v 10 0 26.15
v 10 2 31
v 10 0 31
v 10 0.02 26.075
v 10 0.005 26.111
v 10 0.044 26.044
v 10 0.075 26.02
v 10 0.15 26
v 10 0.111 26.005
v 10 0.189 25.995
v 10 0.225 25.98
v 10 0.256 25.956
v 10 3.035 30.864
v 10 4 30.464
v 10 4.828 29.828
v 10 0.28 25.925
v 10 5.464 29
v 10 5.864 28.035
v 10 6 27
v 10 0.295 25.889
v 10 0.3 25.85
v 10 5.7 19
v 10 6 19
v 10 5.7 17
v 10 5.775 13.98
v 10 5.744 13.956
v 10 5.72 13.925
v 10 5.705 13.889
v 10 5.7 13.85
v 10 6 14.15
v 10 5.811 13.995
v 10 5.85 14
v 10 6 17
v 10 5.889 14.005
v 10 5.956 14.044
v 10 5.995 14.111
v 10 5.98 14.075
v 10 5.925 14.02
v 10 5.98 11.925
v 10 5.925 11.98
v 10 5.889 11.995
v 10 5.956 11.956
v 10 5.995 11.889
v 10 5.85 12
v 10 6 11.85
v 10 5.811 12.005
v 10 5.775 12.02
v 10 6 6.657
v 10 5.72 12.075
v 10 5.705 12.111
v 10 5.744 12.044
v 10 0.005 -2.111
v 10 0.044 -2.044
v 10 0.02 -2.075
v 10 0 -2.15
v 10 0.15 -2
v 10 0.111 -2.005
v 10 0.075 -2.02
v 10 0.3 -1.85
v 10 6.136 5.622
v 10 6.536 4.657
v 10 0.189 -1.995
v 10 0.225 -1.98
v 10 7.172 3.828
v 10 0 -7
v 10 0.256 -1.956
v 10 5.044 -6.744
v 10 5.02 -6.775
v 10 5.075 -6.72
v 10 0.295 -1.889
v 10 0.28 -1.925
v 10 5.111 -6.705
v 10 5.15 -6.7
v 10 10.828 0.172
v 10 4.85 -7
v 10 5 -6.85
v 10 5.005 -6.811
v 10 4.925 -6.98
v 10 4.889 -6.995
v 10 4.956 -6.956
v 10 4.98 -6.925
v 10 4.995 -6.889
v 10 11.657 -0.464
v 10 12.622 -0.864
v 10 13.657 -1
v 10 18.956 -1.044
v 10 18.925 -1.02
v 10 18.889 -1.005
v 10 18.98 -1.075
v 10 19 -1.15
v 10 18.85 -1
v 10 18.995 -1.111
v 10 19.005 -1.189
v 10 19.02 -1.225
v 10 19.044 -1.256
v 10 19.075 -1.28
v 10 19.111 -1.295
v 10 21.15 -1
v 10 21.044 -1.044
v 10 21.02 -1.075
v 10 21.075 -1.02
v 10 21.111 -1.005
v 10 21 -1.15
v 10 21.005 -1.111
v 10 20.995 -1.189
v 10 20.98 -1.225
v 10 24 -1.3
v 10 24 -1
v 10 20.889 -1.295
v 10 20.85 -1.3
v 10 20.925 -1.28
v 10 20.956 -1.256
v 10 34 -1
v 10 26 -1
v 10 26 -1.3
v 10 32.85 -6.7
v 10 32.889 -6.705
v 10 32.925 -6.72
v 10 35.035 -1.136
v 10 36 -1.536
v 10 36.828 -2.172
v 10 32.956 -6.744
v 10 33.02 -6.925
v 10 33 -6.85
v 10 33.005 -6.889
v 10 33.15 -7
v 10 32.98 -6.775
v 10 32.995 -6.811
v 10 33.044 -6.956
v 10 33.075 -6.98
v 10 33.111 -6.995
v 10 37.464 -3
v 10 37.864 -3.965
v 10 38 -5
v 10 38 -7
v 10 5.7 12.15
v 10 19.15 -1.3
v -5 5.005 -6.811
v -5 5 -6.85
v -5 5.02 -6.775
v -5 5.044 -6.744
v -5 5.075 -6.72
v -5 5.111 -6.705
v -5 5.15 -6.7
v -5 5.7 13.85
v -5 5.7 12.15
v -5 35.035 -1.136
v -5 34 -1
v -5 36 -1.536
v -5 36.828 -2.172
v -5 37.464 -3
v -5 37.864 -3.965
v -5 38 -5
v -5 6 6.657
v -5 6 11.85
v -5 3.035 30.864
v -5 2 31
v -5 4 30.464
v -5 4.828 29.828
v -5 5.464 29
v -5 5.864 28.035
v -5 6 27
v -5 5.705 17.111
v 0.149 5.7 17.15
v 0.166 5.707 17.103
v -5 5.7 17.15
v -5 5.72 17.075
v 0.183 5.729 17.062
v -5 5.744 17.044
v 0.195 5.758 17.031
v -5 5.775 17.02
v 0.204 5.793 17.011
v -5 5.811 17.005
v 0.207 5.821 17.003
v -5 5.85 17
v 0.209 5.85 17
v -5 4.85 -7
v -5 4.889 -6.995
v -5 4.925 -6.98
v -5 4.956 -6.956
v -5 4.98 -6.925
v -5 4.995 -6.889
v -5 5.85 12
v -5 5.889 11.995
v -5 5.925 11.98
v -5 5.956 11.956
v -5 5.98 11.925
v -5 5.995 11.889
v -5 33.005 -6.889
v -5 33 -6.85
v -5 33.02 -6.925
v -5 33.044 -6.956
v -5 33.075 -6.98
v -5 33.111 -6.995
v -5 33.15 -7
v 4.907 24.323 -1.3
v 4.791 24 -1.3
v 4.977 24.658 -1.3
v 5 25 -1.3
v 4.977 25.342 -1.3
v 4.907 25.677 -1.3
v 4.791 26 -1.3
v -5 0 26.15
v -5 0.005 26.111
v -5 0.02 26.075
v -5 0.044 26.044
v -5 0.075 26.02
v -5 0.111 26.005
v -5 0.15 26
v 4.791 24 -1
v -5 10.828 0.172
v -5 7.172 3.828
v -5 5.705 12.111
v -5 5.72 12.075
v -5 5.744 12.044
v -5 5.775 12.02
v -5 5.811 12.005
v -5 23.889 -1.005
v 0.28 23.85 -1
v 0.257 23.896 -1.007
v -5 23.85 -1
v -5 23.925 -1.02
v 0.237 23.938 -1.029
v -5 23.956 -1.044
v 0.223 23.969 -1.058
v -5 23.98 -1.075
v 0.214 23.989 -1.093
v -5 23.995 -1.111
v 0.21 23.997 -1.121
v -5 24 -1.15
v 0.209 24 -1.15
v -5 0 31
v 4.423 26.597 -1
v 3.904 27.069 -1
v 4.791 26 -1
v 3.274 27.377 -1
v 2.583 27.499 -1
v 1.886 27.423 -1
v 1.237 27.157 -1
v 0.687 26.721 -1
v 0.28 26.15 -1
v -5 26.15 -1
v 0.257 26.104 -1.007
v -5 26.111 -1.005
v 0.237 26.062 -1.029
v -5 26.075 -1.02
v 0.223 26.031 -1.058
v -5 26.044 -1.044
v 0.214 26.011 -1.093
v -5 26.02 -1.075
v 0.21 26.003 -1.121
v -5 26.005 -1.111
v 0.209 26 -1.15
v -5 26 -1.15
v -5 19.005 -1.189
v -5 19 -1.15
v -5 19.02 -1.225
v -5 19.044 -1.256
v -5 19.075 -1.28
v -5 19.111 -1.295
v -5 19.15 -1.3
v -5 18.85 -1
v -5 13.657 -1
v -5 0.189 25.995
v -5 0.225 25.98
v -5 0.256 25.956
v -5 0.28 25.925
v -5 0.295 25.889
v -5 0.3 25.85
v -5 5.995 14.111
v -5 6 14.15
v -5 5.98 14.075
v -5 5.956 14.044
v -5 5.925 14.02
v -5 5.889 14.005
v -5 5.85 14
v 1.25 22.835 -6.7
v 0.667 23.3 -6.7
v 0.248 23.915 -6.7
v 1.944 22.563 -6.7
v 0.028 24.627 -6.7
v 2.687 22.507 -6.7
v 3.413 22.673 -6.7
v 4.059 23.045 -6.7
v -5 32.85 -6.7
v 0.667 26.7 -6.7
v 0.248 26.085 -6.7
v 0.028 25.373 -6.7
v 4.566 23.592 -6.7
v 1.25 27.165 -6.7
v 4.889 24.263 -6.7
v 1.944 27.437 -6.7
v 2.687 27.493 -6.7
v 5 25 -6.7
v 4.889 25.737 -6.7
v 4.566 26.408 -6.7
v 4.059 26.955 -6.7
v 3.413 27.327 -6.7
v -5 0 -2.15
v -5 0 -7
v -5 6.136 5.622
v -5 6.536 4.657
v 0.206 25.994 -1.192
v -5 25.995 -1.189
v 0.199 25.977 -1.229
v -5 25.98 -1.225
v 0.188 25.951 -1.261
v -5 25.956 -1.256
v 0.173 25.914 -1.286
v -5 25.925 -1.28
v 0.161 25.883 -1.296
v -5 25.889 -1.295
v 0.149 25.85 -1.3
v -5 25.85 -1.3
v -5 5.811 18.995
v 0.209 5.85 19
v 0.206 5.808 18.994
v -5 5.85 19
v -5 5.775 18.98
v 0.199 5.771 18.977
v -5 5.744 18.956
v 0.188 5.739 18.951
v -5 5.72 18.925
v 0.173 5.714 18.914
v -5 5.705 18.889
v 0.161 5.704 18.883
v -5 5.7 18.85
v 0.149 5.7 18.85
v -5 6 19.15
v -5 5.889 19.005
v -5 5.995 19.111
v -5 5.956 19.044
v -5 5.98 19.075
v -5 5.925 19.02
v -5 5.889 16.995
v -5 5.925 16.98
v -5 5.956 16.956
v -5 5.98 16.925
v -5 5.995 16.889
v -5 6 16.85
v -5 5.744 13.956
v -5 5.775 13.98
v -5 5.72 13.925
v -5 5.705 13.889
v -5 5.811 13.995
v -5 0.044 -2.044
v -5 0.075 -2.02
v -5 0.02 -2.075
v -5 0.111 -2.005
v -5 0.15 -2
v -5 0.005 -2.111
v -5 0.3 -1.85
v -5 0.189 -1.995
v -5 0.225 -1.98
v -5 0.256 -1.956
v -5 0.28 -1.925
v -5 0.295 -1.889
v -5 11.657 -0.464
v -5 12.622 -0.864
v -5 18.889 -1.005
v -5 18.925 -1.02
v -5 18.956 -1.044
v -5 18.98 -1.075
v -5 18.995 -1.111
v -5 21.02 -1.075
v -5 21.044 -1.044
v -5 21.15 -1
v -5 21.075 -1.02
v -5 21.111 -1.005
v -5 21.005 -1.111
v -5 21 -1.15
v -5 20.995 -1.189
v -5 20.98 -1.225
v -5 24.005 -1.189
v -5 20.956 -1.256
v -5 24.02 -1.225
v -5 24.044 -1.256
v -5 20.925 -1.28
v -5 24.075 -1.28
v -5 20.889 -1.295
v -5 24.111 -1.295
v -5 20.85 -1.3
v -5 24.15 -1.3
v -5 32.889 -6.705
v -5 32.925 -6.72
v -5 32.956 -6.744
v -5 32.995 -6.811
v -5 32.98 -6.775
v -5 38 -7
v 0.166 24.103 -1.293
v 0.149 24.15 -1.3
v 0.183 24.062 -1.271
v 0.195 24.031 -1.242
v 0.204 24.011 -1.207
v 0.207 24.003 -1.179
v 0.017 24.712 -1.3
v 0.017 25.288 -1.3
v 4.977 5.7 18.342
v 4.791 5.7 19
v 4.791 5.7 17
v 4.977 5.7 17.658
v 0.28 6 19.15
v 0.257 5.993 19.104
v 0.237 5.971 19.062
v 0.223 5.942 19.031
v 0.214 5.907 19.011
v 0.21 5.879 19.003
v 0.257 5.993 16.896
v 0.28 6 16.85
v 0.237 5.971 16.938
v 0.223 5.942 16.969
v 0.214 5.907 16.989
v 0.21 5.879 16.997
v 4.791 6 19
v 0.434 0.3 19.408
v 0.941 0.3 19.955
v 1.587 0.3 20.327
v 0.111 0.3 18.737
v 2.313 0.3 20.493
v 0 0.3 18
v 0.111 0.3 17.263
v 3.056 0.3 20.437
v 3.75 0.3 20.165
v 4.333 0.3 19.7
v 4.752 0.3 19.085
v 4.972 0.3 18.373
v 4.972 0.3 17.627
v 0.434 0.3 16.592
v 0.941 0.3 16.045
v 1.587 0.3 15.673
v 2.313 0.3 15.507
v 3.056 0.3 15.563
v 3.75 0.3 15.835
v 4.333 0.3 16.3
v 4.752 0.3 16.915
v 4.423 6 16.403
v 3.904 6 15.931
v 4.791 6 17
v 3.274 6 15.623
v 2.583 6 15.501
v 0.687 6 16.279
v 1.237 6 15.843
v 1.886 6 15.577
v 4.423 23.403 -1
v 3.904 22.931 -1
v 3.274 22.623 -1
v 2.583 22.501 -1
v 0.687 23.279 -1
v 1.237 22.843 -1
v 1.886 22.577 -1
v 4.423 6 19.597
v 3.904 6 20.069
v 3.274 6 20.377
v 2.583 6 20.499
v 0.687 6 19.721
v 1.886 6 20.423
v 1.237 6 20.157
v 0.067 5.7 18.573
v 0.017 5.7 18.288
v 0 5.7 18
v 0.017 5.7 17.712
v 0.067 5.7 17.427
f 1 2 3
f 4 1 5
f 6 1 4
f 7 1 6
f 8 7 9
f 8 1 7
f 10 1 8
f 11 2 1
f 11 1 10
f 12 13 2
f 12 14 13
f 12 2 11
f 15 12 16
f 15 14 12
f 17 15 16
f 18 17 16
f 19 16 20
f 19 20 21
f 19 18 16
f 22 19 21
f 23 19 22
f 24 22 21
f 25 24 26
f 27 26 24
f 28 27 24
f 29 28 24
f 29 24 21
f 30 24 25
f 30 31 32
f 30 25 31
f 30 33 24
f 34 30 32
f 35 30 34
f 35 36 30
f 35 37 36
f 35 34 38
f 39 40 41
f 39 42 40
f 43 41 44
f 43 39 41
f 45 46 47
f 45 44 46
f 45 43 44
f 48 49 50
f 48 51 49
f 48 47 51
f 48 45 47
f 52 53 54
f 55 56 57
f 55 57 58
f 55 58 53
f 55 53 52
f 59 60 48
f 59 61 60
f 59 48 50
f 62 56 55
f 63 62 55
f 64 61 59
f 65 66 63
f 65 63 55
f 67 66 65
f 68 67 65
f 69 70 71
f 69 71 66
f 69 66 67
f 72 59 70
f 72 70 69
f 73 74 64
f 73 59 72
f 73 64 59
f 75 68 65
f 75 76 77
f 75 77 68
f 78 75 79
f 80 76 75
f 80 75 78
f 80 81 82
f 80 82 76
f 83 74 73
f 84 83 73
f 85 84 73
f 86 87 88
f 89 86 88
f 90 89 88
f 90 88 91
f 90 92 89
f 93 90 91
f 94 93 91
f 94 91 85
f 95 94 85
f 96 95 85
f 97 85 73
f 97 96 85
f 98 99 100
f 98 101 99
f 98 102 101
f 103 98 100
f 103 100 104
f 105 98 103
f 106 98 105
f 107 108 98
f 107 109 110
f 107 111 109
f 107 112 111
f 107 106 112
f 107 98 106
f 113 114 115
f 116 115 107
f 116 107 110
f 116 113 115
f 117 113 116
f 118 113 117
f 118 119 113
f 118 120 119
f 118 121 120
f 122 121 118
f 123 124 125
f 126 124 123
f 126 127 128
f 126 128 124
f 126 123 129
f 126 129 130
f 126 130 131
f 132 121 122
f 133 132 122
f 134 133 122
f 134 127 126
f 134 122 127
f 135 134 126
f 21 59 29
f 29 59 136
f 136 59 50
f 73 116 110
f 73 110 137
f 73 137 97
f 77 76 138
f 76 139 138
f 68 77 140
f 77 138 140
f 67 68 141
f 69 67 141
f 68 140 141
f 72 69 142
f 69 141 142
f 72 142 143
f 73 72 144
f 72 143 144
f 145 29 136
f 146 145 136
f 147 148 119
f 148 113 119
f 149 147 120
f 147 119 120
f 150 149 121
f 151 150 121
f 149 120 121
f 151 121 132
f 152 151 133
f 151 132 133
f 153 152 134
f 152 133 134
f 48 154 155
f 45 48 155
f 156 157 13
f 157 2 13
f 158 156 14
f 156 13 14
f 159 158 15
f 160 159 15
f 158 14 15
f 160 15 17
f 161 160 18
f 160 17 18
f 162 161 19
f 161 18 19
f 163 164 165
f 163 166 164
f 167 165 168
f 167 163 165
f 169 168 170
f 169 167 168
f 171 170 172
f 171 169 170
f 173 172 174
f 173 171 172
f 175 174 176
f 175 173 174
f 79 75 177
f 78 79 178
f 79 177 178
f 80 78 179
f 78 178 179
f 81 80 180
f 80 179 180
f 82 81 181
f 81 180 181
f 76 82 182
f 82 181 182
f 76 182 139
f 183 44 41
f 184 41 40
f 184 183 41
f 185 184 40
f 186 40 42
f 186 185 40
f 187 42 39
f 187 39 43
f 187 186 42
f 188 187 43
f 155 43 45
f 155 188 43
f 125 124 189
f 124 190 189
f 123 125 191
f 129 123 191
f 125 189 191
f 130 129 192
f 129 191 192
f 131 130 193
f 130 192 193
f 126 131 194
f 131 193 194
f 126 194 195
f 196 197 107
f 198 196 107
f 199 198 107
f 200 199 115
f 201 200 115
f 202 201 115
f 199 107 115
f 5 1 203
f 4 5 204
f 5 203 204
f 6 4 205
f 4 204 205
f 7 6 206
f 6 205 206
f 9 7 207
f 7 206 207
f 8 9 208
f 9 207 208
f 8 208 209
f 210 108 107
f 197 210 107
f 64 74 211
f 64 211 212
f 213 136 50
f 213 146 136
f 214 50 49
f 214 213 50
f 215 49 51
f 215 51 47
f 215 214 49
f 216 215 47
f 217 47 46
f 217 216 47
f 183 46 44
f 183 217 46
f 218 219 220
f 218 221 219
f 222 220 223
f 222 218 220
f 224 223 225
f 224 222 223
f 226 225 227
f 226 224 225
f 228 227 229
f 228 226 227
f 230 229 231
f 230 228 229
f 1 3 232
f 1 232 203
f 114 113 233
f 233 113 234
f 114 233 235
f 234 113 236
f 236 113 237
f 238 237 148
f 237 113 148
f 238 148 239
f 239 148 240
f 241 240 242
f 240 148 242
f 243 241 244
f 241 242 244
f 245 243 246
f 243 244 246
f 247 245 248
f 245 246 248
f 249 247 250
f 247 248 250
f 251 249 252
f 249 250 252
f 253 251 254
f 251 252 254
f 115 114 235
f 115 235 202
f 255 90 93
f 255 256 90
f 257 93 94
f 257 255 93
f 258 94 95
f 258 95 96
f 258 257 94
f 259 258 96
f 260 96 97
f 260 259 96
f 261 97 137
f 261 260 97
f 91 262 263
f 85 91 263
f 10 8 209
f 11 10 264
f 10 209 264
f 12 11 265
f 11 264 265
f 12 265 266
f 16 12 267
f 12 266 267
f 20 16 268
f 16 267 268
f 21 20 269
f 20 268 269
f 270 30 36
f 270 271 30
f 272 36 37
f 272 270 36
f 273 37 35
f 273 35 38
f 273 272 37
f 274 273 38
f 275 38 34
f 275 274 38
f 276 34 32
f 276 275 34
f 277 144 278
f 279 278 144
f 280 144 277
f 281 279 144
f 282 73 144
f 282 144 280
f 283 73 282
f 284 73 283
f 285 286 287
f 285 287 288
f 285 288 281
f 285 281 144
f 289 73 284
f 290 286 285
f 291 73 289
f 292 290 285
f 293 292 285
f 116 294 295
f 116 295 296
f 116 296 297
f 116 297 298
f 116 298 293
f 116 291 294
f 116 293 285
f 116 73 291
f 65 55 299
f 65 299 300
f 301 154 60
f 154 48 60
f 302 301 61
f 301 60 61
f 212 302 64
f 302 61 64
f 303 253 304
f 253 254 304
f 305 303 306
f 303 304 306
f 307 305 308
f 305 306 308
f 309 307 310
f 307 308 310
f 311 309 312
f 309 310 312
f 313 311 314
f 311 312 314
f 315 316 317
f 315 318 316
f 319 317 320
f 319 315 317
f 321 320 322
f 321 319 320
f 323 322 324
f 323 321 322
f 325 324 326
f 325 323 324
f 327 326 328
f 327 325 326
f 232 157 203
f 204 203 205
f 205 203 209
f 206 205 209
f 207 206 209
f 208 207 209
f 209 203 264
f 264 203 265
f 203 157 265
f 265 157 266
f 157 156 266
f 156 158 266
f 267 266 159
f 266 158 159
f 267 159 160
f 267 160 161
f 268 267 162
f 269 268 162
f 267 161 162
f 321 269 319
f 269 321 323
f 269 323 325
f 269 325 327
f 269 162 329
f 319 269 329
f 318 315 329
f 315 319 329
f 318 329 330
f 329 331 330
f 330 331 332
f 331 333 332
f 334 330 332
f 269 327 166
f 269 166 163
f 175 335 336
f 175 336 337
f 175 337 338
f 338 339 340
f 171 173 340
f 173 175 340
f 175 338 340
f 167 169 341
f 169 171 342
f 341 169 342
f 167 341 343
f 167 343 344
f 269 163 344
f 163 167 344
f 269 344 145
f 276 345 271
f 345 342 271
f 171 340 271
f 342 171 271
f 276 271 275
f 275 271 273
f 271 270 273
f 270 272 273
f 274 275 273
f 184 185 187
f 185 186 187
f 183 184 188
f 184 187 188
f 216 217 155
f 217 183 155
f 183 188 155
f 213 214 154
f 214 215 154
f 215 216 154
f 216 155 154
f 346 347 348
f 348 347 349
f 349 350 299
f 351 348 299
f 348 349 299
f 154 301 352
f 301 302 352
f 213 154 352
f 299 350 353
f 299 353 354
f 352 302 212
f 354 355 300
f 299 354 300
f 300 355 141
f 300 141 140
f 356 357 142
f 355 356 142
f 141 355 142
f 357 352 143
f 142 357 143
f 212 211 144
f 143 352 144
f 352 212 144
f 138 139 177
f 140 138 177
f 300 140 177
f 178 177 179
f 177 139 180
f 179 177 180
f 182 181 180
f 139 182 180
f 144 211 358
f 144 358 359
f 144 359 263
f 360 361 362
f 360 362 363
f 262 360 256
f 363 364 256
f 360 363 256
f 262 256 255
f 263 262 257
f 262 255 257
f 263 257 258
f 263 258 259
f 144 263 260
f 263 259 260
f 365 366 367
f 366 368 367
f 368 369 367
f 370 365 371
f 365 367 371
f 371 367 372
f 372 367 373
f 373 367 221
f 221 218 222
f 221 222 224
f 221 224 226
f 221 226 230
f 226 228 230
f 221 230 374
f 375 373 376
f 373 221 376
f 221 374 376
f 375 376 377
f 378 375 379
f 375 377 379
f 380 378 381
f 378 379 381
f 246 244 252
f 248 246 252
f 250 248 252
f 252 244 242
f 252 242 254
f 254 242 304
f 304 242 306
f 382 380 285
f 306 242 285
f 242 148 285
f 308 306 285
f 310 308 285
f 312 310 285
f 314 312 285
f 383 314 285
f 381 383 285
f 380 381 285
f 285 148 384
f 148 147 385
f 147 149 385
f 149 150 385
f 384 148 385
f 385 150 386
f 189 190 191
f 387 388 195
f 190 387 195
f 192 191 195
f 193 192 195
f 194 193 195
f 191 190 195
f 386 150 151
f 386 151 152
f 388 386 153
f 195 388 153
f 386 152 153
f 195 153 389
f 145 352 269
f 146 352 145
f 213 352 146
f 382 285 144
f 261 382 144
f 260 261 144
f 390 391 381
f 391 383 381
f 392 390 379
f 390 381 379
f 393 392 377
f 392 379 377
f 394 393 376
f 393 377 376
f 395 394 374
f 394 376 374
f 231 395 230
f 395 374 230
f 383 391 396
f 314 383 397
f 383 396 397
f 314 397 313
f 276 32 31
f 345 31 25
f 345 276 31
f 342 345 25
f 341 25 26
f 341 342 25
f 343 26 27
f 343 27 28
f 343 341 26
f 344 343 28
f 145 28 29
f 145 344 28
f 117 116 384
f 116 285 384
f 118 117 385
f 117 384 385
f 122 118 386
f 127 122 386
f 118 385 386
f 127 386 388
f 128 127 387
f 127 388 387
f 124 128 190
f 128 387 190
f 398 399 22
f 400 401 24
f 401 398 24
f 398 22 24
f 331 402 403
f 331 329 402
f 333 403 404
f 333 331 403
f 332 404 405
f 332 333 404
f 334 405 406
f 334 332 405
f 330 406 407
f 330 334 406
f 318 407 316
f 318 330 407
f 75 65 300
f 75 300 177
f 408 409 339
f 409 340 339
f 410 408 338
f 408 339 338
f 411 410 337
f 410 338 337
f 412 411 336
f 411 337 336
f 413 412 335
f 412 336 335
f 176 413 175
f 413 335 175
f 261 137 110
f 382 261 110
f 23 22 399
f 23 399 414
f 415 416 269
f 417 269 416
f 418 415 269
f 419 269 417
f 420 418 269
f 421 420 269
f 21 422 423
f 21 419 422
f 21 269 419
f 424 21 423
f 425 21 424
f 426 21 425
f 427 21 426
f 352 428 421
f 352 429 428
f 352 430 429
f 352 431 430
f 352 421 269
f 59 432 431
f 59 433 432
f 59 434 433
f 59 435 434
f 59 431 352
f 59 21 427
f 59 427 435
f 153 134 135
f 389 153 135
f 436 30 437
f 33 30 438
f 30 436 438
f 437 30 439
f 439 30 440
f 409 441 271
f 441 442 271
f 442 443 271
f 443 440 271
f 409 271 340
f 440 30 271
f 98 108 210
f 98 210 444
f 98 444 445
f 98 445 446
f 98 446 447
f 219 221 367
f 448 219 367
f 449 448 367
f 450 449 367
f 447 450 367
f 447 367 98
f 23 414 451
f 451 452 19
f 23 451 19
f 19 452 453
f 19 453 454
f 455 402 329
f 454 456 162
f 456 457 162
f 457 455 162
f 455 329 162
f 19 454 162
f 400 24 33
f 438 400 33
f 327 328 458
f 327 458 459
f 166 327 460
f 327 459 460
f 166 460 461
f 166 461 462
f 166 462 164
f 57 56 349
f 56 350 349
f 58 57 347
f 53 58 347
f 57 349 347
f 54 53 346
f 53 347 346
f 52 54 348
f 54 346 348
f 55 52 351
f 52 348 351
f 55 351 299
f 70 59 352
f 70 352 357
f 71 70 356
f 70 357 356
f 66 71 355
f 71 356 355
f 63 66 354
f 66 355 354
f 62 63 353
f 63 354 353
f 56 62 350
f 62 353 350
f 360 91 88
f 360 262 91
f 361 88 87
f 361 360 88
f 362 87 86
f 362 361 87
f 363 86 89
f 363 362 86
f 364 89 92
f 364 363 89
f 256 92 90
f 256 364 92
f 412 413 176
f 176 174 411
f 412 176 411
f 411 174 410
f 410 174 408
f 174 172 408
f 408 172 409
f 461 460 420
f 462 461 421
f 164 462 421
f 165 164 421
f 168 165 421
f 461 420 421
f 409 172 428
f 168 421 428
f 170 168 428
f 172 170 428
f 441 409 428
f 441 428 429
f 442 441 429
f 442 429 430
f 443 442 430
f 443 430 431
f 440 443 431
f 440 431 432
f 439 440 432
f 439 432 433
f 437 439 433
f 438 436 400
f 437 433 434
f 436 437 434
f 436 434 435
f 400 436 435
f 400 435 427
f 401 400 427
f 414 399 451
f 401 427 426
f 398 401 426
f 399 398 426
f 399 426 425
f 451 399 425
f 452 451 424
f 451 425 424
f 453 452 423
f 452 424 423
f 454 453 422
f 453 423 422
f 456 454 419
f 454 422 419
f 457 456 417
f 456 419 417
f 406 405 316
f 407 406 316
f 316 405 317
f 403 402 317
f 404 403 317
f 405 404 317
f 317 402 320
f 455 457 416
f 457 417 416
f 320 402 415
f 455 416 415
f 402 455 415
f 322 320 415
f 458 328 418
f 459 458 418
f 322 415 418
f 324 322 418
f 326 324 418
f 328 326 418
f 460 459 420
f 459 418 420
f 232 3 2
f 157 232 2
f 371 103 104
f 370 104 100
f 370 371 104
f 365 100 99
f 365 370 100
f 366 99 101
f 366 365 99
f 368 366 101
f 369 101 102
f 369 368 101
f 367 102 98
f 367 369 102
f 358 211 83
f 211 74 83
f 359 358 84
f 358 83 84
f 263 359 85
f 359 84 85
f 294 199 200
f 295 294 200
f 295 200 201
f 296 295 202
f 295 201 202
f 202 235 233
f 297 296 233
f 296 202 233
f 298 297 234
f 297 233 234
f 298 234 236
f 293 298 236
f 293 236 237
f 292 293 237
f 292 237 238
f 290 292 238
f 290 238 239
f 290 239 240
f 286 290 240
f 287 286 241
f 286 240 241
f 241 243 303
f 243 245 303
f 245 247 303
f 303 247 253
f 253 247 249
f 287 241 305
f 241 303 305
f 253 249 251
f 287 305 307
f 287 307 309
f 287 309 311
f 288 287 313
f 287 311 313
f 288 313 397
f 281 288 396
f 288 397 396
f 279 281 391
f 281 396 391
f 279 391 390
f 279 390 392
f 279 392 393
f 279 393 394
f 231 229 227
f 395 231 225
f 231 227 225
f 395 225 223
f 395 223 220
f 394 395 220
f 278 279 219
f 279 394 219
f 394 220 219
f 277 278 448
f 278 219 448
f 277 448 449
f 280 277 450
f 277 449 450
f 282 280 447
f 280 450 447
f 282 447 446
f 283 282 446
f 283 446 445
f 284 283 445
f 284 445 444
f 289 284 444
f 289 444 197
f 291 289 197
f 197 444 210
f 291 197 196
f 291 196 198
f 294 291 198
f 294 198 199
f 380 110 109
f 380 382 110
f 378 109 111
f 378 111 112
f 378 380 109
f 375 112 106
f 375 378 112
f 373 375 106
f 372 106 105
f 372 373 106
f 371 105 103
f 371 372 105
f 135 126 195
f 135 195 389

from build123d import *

# Parameters (mm, degrees)
ESBO_O1_W                  = 38
ESBO_O1_H                  = 38
RESSALTO_EXTRUS_O1_DEPTH   = 15
CORTE_EXTRUS_O1_DEPTH      = 52.28352562
ESBO_O7_W                  = 0.3
ESBO_O7_H                  = 28
ESBO_O7_W_2                = 28
ESBO_O7_H_2                = 0.3
ESBO_O7_W_3                = 2
ESBO_O7_H_3                = 2
CORTE_EXTRUS_O2_DEPTH      = 52.28352562
FURO_DE_DI_METRO_7_0_7_3_D = 5
FURO_DE_DI_METRO_7_0_7_2_D = 5
FILETE1_R                  = 4
FILETE2_R                  = 0.15


with BuildPart() as part:
    # Esboço1 → Ressalto-extrusão1 (new body)
    with BuildSketch(Plane(origin=(10, 0, 0), x_dir=(0, 0, -1), z_dir=(1, 0, 0))):
        with Locations((-12, 19)):
            Rectangle(ESBO_O1_W, ESBO_O1_H)
    extrude(amount=-RESSALTO_EXTRUS_O1_DEPTH)

    # Esboço2 → Corte-extrusão1 (cut, through all)
    with BuildSketch(Plane.ZY.offset(5)):
        Polygon((31, 38), (-1, 38), (-1, 12), (5, 6), (31, 6), align=None)
    extrude(amount=-CORTE_EXTRUS_O1_DEPTH, mode=Mode.SUBTRACT)

    # Esboço7 → Corte-extrusão2 (cut, through all)
    with BuildSketch(Plane(origin=(10, 0, 0), x_dir=(0, 0, -1), z_dir=(1, 0, 0))):
        with Locations((6.85, 19)):
            Rectangle(ESBO_O7_W, ESBO_O7_H)
        with Locations((-12, 0.15)):
            Rectangle(ESBO_O7_W_2, ESBO_O7_H_2)
        with Locations((-13, 5.85)):
            Rectangle(ESBO_O7_W_3, ESBO_O7_H_2)
        with Locations((1.15, 20)):
            Rectangle(ESBO_O7_W, ESBO_O7_H_3)
        with Locations((-18, 5.85)):
            Rectangle(ESBO_O7_W_3, ESBO_O7_H_2)
        with Locations((1.15, 25)):
            Rectangle(ESBO_O7_W, ESBO_O7_H_3)
    extrude(amount=-CORTE_EXTRUS_O2_DEPTH, mode=Mode.SUBTRACT)

    # Furo de diâmetro Ø7.0 (7)3 (through all)
    with Locations(Plane(origin=(0, 6, 0), x_dir=(1, 0, 0), z_dir=(0, 1, 0))):
        with Locations((2.5, -18)):
            Hole(FURO_DE_DI_METRO_7_0_7_3_D / 2)

    # Furo de diâmetro Ø7.0 (7)2 (through all)
    with Locations(Plane(origin=(0, 0, -7), x_dir=(-1, 0, 0), z_dir=(0, 0, -1))):
        with Locations((-2.5, 25)):
            Hole(FURO_DE_DI_METRO_7_0_7_2_D / 2)

    # Filete1
    filete1_edges = [part.edges().sort_by_distance(p)[0] for p in [
        (2.5, 6, 31),
        (2.5, 6, 5),
        (2.5, 12, -1),
        (2.5, 38, -1),
    ]]
    fillet(filete1_edges, radius=FILETE1_R)

    # Filete2
    filete2_edges = [part.edges().sort_by_distance(p)[0] for p in [
        (2.5, 5, -7),
        (2.5, 5, -6.7),
        (2.5, 33, -7),
        (2.5, 33, -6.7),
        (2.5, 0, 26),
        (2.5, 0.3, 26),
        (2.5, 0.3, -2),
        (2.5, 0, -2),
        (2.5, 19, -1.3),
        (2.5, 19, -1),
        (2.5, 21, -1.3),
        (2.5, 21, -1),
        (2.5, 5.7, 14),
        (2.5, 6, 14),
        (2.5, 5.7, 12),
        (2.5, 6, 12),
        (-2.395643924, 26, -1.3),
        (-2.395643924, 24, -1.3),
        (-2.395643924, 24, -1),
        (-2.395643924, 26, -1),
        (-2.395643924, 5.7, 19),
        (-2.395643924, 5.7, 17),
        (-2.395643924, 6, 17),
        (-2.395643924, 6, 19),
    ]]
    fillet(filete2_edges, radius=FILETE2_R - 0.0001)  # a hair under: the kernel refuses the full size


solid = part.part
